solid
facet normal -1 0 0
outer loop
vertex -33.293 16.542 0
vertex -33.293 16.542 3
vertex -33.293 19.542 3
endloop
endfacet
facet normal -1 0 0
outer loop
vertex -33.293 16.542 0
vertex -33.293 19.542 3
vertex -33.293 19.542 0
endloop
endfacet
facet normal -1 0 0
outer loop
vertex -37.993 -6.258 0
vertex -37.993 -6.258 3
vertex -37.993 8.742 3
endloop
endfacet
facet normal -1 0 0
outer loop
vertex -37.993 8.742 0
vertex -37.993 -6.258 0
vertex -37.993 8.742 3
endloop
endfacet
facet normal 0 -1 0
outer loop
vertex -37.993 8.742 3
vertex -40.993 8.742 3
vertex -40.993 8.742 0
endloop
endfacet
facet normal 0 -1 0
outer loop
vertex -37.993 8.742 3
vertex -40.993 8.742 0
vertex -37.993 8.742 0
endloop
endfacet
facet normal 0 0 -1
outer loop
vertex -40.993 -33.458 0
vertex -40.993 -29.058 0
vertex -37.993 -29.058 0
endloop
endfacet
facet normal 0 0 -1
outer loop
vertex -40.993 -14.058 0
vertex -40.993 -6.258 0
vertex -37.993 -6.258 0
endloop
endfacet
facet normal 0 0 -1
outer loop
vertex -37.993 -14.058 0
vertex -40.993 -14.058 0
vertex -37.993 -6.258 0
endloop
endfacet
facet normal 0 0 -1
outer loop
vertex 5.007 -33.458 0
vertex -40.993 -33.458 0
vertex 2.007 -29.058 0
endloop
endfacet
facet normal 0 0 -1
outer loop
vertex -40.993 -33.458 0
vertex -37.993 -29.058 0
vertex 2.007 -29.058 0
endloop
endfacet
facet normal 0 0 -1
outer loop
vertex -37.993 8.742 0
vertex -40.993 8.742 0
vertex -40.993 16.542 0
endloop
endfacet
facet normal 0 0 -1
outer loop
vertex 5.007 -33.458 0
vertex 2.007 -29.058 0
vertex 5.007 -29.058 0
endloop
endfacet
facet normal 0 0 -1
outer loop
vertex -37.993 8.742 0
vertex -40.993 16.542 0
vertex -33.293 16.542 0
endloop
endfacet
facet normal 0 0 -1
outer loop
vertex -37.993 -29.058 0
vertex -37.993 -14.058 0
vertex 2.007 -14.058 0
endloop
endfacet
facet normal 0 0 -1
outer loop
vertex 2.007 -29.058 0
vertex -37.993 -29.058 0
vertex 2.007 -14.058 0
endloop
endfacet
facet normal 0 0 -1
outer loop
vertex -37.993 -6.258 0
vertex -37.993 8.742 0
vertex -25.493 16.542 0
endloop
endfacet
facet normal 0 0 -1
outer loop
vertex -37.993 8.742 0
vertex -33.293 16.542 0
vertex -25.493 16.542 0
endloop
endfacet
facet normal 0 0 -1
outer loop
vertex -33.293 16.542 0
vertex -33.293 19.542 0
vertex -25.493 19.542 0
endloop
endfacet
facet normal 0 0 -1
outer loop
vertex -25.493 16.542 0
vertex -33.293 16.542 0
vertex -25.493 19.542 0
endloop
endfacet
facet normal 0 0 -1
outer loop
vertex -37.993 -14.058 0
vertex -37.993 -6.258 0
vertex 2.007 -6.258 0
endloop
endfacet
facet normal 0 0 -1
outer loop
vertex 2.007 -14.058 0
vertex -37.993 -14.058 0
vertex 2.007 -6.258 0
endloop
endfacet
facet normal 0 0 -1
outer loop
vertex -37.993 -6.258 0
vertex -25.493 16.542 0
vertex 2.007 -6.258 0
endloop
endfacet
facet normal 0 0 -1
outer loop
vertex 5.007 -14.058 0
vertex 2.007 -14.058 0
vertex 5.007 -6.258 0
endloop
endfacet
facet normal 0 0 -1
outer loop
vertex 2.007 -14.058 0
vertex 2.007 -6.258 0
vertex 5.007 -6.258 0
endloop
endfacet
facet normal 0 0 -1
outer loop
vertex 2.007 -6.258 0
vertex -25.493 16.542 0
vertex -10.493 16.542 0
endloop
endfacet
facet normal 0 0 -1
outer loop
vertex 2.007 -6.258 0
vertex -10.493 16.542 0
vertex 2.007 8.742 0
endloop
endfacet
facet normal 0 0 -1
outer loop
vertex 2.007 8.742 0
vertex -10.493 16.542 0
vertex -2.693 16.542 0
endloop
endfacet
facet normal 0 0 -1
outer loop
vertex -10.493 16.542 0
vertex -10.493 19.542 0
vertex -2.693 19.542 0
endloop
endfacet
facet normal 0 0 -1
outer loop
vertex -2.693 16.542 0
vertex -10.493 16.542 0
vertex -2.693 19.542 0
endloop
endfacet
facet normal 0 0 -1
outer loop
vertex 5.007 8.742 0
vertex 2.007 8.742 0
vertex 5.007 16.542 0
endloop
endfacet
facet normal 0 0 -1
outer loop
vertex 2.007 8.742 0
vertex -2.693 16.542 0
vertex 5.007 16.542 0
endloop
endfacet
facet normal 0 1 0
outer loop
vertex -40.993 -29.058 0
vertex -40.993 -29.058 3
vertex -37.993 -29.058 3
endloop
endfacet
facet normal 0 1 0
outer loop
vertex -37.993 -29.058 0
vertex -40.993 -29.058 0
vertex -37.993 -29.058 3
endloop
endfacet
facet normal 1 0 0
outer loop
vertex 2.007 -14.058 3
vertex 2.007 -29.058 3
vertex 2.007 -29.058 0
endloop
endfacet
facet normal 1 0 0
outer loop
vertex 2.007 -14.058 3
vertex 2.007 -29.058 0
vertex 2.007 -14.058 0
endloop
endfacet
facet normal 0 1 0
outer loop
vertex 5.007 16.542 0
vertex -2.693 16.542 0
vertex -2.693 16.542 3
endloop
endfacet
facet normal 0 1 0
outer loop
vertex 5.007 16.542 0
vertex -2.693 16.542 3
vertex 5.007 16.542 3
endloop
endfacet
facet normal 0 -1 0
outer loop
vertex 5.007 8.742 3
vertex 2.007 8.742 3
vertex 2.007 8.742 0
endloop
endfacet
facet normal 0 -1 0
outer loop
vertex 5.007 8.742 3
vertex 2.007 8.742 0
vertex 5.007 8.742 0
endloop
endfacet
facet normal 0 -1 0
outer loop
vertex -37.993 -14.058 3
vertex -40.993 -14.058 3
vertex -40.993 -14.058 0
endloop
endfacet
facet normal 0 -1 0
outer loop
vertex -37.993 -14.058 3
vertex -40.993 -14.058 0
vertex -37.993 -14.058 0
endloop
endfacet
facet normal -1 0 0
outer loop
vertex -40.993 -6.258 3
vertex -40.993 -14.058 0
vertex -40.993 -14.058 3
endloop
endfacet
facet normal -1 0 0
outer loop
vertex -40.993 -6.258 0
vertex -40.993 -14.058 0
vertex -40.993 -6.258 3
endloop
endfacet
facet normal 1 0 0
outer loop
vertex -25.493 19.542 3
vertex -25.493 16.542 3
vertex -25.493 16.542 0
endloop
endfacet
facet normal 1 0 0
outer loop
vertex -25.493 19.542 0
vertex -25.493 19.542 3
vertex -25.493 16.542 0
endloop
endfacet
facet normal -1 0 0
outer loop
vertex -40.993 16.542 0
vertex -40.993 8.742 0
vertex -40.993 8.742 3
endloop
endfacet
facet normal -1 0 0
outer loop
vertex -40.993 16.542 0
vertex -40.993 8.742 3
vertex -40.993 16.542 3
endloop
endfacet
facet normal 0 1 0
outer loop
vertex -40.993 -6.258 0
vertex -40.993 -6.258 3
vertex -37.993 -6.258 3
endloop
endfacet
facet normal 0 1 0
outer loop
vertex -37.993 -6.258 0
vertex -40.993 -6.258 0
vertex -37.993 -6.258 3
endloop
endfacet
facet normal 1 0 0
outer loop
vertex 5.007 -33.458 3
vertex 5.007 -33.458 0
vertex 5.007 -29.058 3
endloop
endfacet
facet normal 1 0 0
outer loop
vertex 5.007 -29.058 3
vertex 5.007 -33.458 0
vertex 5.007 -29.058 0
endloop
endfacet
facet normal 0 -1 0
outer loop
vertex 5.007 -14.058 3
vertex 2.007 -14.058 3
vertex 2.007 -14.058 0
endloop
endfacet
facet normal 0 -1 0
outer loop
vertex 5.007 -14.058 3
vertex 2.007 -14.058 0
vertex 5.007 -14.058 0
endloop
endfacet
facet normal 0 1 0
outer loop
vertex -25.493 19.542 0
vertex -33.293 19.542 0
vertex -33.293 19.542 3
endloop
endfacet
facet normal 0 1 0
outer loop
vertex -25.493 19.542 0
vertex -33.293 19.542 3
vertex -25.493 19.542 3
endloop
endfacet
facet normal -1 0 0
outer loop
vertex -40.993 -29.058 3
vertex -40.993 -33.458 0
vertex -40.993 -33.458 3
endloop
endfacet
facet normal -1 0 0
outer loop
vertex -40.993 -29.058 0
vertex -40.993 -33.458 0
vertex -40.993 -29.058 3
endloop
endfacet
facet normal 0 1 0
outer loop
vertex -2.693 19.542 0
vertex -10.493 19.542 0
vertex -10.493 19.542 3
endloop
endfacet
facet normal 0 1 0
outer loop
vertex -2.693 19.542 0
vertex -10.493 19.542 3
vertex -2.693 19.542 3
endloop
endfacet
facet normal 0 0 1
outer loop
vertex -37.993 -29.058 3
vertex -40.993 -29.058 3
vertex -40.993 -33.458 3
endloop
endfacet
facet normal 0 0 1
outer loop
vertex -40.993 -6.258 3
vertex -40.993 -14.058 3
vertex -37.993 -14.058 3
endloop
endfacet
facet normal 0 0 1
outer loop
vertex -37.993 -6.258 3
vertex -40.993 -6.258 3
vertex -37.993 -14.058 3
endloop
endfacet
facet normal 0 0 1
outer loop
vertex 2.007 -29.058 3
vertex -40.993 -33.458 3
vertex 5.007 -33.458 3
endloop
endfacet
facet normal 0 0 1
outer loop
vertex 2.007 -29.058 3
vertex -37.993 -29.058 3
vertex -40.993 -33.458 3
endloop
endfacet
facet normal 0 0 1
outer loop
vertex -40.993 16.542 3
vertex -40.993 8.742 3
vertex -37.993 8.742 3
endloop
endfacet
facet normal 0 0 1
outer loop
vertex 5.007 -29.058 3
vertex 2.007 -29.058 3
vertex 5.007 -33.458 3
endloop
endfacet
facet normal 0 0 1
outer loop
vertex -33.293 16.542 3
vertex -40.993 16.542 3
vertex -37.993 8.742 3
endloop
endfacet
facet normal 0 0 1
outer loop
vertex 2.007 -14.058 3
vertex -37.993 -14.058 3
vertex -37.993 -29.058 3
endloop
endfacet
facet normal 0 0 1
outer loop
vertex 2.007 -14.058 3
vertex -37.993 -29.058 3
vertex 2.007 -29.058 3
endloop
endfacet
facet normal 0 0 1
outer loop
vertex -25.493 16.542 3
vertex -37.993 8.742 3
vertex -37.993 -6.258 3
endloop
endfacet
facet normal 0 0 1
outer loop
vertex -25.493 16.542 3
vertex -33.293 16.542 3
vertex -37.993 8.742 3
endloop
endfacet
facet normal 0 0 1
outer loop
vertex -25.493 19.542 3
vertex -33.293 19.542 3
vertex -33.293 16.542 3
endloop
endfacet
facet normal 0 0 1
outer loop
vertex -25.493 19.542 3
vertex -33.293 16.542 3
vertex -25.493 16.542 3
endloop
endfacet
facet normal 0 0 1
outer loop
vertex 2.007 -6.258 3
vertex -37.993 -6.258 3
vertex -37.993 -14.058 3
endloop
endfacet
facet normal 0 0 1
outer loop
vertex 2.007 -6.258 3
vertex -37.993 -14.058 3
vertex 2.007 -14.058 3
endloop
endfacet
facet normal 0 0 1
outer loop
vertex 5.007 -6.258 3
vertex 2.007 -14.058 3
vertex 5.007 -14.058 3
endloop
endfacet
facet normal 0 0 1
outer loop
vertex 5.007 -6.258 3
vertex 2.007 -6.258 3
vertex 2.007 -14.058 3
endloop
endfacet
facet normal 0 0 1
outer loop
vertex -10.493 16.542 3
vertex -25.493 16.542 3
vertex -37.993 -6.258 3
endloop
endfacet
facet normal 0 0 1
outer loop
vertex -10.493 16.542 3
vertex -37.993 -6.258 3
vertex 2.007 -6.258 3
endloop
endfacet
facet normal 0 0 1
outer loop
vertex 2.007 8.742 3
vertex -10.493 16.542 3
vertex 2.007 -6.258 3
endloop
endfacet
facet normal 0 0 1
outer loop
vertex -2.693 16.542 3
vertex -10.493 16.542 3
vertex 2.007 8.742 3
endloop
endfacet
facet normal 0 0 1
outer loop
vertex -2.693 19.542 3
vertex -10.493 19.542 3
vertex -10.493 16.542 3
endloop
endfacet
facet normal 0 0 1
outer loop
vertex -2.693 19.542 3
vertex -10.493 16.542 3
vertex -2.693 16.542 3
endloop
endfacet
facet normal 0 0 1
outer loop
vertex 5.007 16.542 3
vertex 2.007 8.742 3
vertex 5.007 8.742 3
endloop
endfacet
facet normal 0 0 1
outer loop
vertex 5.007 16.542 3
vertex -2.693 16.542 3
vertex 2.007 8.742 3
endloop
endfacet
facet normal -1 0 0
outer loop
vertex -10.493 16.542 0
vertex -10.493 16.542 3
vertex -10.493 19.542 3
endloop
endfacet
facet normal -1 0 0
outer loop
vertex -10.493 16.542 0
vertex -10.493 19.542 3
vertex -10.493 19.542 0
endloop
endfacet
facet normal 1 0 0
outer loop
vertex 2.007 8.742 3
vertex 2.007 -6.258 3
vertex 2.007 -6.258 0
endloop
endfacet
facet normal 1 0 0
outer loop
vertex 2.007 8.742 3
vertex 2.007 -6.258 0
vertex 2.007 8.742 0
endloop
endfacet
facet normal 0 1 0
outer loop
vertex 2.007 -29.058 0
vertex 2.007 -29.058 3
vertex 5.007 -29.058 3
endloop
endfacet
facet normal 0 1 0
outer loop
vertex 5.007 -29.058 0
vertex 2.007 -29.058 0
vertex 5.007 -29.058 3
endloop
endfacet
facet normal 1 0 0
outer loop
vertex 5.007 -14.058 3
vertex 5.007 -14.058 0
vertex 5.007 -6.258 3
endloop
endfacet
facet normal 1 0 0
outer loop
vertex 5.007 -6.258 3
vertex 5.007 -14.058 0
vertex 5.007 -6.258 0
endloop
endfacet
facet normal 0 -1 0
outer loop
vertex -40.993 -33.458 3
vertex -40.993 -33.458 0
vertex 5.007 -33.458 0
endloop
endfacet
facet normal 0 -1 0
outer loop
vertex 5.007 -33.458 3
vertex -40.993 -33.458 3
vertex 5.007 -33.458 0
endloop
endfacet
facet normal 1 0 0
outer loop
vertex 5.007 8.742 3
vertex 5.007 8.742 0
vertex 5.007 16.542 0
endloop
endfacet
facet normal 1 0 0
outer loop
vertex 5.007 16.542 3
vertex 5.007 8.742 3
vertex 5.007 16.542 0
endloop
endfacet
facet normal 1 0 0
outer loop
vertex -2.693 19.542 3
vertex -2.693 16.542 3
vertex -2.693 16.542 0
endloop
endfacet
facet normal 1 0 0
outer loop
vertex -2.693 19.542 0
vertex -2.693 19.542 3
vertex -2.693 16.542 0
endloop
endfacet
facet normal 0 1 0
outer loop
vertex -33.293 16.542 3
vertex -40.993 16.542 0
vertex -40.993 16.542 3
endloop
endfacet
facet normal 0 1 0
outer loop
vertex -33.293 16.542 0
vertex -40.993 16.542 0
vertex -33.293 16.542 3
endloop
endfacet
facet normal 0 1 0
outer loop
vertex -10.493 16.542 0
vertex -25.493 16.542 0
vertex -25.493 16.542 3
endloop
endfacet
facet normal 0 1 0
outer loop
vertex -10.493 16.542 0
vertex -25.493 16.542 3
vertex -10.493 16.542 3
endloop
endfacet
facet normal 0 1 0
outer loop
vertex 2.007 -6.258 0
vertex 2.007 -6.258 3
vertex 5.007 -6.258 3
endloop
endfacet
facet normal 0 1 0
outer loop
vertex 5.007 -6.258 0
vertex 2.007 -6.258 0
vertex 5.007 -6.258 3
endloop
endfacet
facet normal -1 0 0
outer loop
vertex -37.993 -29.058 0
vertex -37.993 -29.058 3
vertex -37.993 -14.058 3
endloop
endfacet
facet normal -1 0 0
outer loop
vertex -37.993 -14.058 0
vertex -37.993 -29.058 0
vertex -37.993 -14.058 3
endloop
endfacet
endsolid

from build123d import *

# Parameters (mm, degrees)
SKETCH1_W           = 46
SKETCH1_H           = 50
BOSS_EXTRUDE1_DEPTH = 3
SKETCH2_W           = 3
SKETCH2_H           = 15
CUT_EXTRUDE1_DEPTH  = 53.999062732
LPATTERN1_COUNT     = 3
LPATTERN1_PITCH     = 22.8
SKETCH3_W           = 7.8
SKETCH3_H           = 3
BOSS_EXTRUDE2_DEPTH = 3
LPATTERN2_COUNT     = 2
LPATTERN2_PITCH     = 22.8


with BuildPart() as part:
    # Sketch1 → Boss-Extrude1 (new body)
    with BuildSketch(Plane.XY):
        with Locations((-17.993460648, -8.457986111)):
            Rectangle(SKETCH1_W, SKETCH1_H)
    extrude(amount=BOSS_EXTRUDE1_DEPTH)

    # Sketch2 → Cut-Extrude1 (cut, through all)
    with BuildSketch(Plane.XY.offset(3)):
        with Locations((-39.493460648, 1.242013889)):
            Rectangle(SKETCH2_W, SKETCH2_H)
        with Locations((3.506539352, 1.242013889)):
            Rectangle(SKETCH2_W, SKETCH2_H)
    cut_extrude1 = extrude(amount=-CUT_EXTRUDE1_DEPTH, mode=Mode.SUBTRACT)

    # LPattern1: Cut-Extrude1 ×3
    with Locations(*[(0, -i * LPATTERN1_PITCH, 0) for i in range(1, LPATTERN1_COUNT)]):
        add(cut_extrude1, mode=Mode.SUBTRACT)

    # Sketch3 → Boss-Extrude2 (add)
    with BuildSketch(Plane(origin=(0, 16.542013889, 0), x_dir=(1, 0, 0), z_dir=(0, 1, 0))):
        with Locations((-29.393460648, -1.5)):
            Rectangle(SKETCH3_W, SKETCH3_H)
    boss_extrude2 = extrude(amount=BOSS_EXTRUDE2_DEPTH)

    # LPattern2: Boss-Extrude2 ×2
    with Locations(*[(i * LPATTERN2_PITCH, 0, 0) for i in range(1, LPATTERN2_COUNT)]):
        add(boss_extrude2)


solid = part.part
